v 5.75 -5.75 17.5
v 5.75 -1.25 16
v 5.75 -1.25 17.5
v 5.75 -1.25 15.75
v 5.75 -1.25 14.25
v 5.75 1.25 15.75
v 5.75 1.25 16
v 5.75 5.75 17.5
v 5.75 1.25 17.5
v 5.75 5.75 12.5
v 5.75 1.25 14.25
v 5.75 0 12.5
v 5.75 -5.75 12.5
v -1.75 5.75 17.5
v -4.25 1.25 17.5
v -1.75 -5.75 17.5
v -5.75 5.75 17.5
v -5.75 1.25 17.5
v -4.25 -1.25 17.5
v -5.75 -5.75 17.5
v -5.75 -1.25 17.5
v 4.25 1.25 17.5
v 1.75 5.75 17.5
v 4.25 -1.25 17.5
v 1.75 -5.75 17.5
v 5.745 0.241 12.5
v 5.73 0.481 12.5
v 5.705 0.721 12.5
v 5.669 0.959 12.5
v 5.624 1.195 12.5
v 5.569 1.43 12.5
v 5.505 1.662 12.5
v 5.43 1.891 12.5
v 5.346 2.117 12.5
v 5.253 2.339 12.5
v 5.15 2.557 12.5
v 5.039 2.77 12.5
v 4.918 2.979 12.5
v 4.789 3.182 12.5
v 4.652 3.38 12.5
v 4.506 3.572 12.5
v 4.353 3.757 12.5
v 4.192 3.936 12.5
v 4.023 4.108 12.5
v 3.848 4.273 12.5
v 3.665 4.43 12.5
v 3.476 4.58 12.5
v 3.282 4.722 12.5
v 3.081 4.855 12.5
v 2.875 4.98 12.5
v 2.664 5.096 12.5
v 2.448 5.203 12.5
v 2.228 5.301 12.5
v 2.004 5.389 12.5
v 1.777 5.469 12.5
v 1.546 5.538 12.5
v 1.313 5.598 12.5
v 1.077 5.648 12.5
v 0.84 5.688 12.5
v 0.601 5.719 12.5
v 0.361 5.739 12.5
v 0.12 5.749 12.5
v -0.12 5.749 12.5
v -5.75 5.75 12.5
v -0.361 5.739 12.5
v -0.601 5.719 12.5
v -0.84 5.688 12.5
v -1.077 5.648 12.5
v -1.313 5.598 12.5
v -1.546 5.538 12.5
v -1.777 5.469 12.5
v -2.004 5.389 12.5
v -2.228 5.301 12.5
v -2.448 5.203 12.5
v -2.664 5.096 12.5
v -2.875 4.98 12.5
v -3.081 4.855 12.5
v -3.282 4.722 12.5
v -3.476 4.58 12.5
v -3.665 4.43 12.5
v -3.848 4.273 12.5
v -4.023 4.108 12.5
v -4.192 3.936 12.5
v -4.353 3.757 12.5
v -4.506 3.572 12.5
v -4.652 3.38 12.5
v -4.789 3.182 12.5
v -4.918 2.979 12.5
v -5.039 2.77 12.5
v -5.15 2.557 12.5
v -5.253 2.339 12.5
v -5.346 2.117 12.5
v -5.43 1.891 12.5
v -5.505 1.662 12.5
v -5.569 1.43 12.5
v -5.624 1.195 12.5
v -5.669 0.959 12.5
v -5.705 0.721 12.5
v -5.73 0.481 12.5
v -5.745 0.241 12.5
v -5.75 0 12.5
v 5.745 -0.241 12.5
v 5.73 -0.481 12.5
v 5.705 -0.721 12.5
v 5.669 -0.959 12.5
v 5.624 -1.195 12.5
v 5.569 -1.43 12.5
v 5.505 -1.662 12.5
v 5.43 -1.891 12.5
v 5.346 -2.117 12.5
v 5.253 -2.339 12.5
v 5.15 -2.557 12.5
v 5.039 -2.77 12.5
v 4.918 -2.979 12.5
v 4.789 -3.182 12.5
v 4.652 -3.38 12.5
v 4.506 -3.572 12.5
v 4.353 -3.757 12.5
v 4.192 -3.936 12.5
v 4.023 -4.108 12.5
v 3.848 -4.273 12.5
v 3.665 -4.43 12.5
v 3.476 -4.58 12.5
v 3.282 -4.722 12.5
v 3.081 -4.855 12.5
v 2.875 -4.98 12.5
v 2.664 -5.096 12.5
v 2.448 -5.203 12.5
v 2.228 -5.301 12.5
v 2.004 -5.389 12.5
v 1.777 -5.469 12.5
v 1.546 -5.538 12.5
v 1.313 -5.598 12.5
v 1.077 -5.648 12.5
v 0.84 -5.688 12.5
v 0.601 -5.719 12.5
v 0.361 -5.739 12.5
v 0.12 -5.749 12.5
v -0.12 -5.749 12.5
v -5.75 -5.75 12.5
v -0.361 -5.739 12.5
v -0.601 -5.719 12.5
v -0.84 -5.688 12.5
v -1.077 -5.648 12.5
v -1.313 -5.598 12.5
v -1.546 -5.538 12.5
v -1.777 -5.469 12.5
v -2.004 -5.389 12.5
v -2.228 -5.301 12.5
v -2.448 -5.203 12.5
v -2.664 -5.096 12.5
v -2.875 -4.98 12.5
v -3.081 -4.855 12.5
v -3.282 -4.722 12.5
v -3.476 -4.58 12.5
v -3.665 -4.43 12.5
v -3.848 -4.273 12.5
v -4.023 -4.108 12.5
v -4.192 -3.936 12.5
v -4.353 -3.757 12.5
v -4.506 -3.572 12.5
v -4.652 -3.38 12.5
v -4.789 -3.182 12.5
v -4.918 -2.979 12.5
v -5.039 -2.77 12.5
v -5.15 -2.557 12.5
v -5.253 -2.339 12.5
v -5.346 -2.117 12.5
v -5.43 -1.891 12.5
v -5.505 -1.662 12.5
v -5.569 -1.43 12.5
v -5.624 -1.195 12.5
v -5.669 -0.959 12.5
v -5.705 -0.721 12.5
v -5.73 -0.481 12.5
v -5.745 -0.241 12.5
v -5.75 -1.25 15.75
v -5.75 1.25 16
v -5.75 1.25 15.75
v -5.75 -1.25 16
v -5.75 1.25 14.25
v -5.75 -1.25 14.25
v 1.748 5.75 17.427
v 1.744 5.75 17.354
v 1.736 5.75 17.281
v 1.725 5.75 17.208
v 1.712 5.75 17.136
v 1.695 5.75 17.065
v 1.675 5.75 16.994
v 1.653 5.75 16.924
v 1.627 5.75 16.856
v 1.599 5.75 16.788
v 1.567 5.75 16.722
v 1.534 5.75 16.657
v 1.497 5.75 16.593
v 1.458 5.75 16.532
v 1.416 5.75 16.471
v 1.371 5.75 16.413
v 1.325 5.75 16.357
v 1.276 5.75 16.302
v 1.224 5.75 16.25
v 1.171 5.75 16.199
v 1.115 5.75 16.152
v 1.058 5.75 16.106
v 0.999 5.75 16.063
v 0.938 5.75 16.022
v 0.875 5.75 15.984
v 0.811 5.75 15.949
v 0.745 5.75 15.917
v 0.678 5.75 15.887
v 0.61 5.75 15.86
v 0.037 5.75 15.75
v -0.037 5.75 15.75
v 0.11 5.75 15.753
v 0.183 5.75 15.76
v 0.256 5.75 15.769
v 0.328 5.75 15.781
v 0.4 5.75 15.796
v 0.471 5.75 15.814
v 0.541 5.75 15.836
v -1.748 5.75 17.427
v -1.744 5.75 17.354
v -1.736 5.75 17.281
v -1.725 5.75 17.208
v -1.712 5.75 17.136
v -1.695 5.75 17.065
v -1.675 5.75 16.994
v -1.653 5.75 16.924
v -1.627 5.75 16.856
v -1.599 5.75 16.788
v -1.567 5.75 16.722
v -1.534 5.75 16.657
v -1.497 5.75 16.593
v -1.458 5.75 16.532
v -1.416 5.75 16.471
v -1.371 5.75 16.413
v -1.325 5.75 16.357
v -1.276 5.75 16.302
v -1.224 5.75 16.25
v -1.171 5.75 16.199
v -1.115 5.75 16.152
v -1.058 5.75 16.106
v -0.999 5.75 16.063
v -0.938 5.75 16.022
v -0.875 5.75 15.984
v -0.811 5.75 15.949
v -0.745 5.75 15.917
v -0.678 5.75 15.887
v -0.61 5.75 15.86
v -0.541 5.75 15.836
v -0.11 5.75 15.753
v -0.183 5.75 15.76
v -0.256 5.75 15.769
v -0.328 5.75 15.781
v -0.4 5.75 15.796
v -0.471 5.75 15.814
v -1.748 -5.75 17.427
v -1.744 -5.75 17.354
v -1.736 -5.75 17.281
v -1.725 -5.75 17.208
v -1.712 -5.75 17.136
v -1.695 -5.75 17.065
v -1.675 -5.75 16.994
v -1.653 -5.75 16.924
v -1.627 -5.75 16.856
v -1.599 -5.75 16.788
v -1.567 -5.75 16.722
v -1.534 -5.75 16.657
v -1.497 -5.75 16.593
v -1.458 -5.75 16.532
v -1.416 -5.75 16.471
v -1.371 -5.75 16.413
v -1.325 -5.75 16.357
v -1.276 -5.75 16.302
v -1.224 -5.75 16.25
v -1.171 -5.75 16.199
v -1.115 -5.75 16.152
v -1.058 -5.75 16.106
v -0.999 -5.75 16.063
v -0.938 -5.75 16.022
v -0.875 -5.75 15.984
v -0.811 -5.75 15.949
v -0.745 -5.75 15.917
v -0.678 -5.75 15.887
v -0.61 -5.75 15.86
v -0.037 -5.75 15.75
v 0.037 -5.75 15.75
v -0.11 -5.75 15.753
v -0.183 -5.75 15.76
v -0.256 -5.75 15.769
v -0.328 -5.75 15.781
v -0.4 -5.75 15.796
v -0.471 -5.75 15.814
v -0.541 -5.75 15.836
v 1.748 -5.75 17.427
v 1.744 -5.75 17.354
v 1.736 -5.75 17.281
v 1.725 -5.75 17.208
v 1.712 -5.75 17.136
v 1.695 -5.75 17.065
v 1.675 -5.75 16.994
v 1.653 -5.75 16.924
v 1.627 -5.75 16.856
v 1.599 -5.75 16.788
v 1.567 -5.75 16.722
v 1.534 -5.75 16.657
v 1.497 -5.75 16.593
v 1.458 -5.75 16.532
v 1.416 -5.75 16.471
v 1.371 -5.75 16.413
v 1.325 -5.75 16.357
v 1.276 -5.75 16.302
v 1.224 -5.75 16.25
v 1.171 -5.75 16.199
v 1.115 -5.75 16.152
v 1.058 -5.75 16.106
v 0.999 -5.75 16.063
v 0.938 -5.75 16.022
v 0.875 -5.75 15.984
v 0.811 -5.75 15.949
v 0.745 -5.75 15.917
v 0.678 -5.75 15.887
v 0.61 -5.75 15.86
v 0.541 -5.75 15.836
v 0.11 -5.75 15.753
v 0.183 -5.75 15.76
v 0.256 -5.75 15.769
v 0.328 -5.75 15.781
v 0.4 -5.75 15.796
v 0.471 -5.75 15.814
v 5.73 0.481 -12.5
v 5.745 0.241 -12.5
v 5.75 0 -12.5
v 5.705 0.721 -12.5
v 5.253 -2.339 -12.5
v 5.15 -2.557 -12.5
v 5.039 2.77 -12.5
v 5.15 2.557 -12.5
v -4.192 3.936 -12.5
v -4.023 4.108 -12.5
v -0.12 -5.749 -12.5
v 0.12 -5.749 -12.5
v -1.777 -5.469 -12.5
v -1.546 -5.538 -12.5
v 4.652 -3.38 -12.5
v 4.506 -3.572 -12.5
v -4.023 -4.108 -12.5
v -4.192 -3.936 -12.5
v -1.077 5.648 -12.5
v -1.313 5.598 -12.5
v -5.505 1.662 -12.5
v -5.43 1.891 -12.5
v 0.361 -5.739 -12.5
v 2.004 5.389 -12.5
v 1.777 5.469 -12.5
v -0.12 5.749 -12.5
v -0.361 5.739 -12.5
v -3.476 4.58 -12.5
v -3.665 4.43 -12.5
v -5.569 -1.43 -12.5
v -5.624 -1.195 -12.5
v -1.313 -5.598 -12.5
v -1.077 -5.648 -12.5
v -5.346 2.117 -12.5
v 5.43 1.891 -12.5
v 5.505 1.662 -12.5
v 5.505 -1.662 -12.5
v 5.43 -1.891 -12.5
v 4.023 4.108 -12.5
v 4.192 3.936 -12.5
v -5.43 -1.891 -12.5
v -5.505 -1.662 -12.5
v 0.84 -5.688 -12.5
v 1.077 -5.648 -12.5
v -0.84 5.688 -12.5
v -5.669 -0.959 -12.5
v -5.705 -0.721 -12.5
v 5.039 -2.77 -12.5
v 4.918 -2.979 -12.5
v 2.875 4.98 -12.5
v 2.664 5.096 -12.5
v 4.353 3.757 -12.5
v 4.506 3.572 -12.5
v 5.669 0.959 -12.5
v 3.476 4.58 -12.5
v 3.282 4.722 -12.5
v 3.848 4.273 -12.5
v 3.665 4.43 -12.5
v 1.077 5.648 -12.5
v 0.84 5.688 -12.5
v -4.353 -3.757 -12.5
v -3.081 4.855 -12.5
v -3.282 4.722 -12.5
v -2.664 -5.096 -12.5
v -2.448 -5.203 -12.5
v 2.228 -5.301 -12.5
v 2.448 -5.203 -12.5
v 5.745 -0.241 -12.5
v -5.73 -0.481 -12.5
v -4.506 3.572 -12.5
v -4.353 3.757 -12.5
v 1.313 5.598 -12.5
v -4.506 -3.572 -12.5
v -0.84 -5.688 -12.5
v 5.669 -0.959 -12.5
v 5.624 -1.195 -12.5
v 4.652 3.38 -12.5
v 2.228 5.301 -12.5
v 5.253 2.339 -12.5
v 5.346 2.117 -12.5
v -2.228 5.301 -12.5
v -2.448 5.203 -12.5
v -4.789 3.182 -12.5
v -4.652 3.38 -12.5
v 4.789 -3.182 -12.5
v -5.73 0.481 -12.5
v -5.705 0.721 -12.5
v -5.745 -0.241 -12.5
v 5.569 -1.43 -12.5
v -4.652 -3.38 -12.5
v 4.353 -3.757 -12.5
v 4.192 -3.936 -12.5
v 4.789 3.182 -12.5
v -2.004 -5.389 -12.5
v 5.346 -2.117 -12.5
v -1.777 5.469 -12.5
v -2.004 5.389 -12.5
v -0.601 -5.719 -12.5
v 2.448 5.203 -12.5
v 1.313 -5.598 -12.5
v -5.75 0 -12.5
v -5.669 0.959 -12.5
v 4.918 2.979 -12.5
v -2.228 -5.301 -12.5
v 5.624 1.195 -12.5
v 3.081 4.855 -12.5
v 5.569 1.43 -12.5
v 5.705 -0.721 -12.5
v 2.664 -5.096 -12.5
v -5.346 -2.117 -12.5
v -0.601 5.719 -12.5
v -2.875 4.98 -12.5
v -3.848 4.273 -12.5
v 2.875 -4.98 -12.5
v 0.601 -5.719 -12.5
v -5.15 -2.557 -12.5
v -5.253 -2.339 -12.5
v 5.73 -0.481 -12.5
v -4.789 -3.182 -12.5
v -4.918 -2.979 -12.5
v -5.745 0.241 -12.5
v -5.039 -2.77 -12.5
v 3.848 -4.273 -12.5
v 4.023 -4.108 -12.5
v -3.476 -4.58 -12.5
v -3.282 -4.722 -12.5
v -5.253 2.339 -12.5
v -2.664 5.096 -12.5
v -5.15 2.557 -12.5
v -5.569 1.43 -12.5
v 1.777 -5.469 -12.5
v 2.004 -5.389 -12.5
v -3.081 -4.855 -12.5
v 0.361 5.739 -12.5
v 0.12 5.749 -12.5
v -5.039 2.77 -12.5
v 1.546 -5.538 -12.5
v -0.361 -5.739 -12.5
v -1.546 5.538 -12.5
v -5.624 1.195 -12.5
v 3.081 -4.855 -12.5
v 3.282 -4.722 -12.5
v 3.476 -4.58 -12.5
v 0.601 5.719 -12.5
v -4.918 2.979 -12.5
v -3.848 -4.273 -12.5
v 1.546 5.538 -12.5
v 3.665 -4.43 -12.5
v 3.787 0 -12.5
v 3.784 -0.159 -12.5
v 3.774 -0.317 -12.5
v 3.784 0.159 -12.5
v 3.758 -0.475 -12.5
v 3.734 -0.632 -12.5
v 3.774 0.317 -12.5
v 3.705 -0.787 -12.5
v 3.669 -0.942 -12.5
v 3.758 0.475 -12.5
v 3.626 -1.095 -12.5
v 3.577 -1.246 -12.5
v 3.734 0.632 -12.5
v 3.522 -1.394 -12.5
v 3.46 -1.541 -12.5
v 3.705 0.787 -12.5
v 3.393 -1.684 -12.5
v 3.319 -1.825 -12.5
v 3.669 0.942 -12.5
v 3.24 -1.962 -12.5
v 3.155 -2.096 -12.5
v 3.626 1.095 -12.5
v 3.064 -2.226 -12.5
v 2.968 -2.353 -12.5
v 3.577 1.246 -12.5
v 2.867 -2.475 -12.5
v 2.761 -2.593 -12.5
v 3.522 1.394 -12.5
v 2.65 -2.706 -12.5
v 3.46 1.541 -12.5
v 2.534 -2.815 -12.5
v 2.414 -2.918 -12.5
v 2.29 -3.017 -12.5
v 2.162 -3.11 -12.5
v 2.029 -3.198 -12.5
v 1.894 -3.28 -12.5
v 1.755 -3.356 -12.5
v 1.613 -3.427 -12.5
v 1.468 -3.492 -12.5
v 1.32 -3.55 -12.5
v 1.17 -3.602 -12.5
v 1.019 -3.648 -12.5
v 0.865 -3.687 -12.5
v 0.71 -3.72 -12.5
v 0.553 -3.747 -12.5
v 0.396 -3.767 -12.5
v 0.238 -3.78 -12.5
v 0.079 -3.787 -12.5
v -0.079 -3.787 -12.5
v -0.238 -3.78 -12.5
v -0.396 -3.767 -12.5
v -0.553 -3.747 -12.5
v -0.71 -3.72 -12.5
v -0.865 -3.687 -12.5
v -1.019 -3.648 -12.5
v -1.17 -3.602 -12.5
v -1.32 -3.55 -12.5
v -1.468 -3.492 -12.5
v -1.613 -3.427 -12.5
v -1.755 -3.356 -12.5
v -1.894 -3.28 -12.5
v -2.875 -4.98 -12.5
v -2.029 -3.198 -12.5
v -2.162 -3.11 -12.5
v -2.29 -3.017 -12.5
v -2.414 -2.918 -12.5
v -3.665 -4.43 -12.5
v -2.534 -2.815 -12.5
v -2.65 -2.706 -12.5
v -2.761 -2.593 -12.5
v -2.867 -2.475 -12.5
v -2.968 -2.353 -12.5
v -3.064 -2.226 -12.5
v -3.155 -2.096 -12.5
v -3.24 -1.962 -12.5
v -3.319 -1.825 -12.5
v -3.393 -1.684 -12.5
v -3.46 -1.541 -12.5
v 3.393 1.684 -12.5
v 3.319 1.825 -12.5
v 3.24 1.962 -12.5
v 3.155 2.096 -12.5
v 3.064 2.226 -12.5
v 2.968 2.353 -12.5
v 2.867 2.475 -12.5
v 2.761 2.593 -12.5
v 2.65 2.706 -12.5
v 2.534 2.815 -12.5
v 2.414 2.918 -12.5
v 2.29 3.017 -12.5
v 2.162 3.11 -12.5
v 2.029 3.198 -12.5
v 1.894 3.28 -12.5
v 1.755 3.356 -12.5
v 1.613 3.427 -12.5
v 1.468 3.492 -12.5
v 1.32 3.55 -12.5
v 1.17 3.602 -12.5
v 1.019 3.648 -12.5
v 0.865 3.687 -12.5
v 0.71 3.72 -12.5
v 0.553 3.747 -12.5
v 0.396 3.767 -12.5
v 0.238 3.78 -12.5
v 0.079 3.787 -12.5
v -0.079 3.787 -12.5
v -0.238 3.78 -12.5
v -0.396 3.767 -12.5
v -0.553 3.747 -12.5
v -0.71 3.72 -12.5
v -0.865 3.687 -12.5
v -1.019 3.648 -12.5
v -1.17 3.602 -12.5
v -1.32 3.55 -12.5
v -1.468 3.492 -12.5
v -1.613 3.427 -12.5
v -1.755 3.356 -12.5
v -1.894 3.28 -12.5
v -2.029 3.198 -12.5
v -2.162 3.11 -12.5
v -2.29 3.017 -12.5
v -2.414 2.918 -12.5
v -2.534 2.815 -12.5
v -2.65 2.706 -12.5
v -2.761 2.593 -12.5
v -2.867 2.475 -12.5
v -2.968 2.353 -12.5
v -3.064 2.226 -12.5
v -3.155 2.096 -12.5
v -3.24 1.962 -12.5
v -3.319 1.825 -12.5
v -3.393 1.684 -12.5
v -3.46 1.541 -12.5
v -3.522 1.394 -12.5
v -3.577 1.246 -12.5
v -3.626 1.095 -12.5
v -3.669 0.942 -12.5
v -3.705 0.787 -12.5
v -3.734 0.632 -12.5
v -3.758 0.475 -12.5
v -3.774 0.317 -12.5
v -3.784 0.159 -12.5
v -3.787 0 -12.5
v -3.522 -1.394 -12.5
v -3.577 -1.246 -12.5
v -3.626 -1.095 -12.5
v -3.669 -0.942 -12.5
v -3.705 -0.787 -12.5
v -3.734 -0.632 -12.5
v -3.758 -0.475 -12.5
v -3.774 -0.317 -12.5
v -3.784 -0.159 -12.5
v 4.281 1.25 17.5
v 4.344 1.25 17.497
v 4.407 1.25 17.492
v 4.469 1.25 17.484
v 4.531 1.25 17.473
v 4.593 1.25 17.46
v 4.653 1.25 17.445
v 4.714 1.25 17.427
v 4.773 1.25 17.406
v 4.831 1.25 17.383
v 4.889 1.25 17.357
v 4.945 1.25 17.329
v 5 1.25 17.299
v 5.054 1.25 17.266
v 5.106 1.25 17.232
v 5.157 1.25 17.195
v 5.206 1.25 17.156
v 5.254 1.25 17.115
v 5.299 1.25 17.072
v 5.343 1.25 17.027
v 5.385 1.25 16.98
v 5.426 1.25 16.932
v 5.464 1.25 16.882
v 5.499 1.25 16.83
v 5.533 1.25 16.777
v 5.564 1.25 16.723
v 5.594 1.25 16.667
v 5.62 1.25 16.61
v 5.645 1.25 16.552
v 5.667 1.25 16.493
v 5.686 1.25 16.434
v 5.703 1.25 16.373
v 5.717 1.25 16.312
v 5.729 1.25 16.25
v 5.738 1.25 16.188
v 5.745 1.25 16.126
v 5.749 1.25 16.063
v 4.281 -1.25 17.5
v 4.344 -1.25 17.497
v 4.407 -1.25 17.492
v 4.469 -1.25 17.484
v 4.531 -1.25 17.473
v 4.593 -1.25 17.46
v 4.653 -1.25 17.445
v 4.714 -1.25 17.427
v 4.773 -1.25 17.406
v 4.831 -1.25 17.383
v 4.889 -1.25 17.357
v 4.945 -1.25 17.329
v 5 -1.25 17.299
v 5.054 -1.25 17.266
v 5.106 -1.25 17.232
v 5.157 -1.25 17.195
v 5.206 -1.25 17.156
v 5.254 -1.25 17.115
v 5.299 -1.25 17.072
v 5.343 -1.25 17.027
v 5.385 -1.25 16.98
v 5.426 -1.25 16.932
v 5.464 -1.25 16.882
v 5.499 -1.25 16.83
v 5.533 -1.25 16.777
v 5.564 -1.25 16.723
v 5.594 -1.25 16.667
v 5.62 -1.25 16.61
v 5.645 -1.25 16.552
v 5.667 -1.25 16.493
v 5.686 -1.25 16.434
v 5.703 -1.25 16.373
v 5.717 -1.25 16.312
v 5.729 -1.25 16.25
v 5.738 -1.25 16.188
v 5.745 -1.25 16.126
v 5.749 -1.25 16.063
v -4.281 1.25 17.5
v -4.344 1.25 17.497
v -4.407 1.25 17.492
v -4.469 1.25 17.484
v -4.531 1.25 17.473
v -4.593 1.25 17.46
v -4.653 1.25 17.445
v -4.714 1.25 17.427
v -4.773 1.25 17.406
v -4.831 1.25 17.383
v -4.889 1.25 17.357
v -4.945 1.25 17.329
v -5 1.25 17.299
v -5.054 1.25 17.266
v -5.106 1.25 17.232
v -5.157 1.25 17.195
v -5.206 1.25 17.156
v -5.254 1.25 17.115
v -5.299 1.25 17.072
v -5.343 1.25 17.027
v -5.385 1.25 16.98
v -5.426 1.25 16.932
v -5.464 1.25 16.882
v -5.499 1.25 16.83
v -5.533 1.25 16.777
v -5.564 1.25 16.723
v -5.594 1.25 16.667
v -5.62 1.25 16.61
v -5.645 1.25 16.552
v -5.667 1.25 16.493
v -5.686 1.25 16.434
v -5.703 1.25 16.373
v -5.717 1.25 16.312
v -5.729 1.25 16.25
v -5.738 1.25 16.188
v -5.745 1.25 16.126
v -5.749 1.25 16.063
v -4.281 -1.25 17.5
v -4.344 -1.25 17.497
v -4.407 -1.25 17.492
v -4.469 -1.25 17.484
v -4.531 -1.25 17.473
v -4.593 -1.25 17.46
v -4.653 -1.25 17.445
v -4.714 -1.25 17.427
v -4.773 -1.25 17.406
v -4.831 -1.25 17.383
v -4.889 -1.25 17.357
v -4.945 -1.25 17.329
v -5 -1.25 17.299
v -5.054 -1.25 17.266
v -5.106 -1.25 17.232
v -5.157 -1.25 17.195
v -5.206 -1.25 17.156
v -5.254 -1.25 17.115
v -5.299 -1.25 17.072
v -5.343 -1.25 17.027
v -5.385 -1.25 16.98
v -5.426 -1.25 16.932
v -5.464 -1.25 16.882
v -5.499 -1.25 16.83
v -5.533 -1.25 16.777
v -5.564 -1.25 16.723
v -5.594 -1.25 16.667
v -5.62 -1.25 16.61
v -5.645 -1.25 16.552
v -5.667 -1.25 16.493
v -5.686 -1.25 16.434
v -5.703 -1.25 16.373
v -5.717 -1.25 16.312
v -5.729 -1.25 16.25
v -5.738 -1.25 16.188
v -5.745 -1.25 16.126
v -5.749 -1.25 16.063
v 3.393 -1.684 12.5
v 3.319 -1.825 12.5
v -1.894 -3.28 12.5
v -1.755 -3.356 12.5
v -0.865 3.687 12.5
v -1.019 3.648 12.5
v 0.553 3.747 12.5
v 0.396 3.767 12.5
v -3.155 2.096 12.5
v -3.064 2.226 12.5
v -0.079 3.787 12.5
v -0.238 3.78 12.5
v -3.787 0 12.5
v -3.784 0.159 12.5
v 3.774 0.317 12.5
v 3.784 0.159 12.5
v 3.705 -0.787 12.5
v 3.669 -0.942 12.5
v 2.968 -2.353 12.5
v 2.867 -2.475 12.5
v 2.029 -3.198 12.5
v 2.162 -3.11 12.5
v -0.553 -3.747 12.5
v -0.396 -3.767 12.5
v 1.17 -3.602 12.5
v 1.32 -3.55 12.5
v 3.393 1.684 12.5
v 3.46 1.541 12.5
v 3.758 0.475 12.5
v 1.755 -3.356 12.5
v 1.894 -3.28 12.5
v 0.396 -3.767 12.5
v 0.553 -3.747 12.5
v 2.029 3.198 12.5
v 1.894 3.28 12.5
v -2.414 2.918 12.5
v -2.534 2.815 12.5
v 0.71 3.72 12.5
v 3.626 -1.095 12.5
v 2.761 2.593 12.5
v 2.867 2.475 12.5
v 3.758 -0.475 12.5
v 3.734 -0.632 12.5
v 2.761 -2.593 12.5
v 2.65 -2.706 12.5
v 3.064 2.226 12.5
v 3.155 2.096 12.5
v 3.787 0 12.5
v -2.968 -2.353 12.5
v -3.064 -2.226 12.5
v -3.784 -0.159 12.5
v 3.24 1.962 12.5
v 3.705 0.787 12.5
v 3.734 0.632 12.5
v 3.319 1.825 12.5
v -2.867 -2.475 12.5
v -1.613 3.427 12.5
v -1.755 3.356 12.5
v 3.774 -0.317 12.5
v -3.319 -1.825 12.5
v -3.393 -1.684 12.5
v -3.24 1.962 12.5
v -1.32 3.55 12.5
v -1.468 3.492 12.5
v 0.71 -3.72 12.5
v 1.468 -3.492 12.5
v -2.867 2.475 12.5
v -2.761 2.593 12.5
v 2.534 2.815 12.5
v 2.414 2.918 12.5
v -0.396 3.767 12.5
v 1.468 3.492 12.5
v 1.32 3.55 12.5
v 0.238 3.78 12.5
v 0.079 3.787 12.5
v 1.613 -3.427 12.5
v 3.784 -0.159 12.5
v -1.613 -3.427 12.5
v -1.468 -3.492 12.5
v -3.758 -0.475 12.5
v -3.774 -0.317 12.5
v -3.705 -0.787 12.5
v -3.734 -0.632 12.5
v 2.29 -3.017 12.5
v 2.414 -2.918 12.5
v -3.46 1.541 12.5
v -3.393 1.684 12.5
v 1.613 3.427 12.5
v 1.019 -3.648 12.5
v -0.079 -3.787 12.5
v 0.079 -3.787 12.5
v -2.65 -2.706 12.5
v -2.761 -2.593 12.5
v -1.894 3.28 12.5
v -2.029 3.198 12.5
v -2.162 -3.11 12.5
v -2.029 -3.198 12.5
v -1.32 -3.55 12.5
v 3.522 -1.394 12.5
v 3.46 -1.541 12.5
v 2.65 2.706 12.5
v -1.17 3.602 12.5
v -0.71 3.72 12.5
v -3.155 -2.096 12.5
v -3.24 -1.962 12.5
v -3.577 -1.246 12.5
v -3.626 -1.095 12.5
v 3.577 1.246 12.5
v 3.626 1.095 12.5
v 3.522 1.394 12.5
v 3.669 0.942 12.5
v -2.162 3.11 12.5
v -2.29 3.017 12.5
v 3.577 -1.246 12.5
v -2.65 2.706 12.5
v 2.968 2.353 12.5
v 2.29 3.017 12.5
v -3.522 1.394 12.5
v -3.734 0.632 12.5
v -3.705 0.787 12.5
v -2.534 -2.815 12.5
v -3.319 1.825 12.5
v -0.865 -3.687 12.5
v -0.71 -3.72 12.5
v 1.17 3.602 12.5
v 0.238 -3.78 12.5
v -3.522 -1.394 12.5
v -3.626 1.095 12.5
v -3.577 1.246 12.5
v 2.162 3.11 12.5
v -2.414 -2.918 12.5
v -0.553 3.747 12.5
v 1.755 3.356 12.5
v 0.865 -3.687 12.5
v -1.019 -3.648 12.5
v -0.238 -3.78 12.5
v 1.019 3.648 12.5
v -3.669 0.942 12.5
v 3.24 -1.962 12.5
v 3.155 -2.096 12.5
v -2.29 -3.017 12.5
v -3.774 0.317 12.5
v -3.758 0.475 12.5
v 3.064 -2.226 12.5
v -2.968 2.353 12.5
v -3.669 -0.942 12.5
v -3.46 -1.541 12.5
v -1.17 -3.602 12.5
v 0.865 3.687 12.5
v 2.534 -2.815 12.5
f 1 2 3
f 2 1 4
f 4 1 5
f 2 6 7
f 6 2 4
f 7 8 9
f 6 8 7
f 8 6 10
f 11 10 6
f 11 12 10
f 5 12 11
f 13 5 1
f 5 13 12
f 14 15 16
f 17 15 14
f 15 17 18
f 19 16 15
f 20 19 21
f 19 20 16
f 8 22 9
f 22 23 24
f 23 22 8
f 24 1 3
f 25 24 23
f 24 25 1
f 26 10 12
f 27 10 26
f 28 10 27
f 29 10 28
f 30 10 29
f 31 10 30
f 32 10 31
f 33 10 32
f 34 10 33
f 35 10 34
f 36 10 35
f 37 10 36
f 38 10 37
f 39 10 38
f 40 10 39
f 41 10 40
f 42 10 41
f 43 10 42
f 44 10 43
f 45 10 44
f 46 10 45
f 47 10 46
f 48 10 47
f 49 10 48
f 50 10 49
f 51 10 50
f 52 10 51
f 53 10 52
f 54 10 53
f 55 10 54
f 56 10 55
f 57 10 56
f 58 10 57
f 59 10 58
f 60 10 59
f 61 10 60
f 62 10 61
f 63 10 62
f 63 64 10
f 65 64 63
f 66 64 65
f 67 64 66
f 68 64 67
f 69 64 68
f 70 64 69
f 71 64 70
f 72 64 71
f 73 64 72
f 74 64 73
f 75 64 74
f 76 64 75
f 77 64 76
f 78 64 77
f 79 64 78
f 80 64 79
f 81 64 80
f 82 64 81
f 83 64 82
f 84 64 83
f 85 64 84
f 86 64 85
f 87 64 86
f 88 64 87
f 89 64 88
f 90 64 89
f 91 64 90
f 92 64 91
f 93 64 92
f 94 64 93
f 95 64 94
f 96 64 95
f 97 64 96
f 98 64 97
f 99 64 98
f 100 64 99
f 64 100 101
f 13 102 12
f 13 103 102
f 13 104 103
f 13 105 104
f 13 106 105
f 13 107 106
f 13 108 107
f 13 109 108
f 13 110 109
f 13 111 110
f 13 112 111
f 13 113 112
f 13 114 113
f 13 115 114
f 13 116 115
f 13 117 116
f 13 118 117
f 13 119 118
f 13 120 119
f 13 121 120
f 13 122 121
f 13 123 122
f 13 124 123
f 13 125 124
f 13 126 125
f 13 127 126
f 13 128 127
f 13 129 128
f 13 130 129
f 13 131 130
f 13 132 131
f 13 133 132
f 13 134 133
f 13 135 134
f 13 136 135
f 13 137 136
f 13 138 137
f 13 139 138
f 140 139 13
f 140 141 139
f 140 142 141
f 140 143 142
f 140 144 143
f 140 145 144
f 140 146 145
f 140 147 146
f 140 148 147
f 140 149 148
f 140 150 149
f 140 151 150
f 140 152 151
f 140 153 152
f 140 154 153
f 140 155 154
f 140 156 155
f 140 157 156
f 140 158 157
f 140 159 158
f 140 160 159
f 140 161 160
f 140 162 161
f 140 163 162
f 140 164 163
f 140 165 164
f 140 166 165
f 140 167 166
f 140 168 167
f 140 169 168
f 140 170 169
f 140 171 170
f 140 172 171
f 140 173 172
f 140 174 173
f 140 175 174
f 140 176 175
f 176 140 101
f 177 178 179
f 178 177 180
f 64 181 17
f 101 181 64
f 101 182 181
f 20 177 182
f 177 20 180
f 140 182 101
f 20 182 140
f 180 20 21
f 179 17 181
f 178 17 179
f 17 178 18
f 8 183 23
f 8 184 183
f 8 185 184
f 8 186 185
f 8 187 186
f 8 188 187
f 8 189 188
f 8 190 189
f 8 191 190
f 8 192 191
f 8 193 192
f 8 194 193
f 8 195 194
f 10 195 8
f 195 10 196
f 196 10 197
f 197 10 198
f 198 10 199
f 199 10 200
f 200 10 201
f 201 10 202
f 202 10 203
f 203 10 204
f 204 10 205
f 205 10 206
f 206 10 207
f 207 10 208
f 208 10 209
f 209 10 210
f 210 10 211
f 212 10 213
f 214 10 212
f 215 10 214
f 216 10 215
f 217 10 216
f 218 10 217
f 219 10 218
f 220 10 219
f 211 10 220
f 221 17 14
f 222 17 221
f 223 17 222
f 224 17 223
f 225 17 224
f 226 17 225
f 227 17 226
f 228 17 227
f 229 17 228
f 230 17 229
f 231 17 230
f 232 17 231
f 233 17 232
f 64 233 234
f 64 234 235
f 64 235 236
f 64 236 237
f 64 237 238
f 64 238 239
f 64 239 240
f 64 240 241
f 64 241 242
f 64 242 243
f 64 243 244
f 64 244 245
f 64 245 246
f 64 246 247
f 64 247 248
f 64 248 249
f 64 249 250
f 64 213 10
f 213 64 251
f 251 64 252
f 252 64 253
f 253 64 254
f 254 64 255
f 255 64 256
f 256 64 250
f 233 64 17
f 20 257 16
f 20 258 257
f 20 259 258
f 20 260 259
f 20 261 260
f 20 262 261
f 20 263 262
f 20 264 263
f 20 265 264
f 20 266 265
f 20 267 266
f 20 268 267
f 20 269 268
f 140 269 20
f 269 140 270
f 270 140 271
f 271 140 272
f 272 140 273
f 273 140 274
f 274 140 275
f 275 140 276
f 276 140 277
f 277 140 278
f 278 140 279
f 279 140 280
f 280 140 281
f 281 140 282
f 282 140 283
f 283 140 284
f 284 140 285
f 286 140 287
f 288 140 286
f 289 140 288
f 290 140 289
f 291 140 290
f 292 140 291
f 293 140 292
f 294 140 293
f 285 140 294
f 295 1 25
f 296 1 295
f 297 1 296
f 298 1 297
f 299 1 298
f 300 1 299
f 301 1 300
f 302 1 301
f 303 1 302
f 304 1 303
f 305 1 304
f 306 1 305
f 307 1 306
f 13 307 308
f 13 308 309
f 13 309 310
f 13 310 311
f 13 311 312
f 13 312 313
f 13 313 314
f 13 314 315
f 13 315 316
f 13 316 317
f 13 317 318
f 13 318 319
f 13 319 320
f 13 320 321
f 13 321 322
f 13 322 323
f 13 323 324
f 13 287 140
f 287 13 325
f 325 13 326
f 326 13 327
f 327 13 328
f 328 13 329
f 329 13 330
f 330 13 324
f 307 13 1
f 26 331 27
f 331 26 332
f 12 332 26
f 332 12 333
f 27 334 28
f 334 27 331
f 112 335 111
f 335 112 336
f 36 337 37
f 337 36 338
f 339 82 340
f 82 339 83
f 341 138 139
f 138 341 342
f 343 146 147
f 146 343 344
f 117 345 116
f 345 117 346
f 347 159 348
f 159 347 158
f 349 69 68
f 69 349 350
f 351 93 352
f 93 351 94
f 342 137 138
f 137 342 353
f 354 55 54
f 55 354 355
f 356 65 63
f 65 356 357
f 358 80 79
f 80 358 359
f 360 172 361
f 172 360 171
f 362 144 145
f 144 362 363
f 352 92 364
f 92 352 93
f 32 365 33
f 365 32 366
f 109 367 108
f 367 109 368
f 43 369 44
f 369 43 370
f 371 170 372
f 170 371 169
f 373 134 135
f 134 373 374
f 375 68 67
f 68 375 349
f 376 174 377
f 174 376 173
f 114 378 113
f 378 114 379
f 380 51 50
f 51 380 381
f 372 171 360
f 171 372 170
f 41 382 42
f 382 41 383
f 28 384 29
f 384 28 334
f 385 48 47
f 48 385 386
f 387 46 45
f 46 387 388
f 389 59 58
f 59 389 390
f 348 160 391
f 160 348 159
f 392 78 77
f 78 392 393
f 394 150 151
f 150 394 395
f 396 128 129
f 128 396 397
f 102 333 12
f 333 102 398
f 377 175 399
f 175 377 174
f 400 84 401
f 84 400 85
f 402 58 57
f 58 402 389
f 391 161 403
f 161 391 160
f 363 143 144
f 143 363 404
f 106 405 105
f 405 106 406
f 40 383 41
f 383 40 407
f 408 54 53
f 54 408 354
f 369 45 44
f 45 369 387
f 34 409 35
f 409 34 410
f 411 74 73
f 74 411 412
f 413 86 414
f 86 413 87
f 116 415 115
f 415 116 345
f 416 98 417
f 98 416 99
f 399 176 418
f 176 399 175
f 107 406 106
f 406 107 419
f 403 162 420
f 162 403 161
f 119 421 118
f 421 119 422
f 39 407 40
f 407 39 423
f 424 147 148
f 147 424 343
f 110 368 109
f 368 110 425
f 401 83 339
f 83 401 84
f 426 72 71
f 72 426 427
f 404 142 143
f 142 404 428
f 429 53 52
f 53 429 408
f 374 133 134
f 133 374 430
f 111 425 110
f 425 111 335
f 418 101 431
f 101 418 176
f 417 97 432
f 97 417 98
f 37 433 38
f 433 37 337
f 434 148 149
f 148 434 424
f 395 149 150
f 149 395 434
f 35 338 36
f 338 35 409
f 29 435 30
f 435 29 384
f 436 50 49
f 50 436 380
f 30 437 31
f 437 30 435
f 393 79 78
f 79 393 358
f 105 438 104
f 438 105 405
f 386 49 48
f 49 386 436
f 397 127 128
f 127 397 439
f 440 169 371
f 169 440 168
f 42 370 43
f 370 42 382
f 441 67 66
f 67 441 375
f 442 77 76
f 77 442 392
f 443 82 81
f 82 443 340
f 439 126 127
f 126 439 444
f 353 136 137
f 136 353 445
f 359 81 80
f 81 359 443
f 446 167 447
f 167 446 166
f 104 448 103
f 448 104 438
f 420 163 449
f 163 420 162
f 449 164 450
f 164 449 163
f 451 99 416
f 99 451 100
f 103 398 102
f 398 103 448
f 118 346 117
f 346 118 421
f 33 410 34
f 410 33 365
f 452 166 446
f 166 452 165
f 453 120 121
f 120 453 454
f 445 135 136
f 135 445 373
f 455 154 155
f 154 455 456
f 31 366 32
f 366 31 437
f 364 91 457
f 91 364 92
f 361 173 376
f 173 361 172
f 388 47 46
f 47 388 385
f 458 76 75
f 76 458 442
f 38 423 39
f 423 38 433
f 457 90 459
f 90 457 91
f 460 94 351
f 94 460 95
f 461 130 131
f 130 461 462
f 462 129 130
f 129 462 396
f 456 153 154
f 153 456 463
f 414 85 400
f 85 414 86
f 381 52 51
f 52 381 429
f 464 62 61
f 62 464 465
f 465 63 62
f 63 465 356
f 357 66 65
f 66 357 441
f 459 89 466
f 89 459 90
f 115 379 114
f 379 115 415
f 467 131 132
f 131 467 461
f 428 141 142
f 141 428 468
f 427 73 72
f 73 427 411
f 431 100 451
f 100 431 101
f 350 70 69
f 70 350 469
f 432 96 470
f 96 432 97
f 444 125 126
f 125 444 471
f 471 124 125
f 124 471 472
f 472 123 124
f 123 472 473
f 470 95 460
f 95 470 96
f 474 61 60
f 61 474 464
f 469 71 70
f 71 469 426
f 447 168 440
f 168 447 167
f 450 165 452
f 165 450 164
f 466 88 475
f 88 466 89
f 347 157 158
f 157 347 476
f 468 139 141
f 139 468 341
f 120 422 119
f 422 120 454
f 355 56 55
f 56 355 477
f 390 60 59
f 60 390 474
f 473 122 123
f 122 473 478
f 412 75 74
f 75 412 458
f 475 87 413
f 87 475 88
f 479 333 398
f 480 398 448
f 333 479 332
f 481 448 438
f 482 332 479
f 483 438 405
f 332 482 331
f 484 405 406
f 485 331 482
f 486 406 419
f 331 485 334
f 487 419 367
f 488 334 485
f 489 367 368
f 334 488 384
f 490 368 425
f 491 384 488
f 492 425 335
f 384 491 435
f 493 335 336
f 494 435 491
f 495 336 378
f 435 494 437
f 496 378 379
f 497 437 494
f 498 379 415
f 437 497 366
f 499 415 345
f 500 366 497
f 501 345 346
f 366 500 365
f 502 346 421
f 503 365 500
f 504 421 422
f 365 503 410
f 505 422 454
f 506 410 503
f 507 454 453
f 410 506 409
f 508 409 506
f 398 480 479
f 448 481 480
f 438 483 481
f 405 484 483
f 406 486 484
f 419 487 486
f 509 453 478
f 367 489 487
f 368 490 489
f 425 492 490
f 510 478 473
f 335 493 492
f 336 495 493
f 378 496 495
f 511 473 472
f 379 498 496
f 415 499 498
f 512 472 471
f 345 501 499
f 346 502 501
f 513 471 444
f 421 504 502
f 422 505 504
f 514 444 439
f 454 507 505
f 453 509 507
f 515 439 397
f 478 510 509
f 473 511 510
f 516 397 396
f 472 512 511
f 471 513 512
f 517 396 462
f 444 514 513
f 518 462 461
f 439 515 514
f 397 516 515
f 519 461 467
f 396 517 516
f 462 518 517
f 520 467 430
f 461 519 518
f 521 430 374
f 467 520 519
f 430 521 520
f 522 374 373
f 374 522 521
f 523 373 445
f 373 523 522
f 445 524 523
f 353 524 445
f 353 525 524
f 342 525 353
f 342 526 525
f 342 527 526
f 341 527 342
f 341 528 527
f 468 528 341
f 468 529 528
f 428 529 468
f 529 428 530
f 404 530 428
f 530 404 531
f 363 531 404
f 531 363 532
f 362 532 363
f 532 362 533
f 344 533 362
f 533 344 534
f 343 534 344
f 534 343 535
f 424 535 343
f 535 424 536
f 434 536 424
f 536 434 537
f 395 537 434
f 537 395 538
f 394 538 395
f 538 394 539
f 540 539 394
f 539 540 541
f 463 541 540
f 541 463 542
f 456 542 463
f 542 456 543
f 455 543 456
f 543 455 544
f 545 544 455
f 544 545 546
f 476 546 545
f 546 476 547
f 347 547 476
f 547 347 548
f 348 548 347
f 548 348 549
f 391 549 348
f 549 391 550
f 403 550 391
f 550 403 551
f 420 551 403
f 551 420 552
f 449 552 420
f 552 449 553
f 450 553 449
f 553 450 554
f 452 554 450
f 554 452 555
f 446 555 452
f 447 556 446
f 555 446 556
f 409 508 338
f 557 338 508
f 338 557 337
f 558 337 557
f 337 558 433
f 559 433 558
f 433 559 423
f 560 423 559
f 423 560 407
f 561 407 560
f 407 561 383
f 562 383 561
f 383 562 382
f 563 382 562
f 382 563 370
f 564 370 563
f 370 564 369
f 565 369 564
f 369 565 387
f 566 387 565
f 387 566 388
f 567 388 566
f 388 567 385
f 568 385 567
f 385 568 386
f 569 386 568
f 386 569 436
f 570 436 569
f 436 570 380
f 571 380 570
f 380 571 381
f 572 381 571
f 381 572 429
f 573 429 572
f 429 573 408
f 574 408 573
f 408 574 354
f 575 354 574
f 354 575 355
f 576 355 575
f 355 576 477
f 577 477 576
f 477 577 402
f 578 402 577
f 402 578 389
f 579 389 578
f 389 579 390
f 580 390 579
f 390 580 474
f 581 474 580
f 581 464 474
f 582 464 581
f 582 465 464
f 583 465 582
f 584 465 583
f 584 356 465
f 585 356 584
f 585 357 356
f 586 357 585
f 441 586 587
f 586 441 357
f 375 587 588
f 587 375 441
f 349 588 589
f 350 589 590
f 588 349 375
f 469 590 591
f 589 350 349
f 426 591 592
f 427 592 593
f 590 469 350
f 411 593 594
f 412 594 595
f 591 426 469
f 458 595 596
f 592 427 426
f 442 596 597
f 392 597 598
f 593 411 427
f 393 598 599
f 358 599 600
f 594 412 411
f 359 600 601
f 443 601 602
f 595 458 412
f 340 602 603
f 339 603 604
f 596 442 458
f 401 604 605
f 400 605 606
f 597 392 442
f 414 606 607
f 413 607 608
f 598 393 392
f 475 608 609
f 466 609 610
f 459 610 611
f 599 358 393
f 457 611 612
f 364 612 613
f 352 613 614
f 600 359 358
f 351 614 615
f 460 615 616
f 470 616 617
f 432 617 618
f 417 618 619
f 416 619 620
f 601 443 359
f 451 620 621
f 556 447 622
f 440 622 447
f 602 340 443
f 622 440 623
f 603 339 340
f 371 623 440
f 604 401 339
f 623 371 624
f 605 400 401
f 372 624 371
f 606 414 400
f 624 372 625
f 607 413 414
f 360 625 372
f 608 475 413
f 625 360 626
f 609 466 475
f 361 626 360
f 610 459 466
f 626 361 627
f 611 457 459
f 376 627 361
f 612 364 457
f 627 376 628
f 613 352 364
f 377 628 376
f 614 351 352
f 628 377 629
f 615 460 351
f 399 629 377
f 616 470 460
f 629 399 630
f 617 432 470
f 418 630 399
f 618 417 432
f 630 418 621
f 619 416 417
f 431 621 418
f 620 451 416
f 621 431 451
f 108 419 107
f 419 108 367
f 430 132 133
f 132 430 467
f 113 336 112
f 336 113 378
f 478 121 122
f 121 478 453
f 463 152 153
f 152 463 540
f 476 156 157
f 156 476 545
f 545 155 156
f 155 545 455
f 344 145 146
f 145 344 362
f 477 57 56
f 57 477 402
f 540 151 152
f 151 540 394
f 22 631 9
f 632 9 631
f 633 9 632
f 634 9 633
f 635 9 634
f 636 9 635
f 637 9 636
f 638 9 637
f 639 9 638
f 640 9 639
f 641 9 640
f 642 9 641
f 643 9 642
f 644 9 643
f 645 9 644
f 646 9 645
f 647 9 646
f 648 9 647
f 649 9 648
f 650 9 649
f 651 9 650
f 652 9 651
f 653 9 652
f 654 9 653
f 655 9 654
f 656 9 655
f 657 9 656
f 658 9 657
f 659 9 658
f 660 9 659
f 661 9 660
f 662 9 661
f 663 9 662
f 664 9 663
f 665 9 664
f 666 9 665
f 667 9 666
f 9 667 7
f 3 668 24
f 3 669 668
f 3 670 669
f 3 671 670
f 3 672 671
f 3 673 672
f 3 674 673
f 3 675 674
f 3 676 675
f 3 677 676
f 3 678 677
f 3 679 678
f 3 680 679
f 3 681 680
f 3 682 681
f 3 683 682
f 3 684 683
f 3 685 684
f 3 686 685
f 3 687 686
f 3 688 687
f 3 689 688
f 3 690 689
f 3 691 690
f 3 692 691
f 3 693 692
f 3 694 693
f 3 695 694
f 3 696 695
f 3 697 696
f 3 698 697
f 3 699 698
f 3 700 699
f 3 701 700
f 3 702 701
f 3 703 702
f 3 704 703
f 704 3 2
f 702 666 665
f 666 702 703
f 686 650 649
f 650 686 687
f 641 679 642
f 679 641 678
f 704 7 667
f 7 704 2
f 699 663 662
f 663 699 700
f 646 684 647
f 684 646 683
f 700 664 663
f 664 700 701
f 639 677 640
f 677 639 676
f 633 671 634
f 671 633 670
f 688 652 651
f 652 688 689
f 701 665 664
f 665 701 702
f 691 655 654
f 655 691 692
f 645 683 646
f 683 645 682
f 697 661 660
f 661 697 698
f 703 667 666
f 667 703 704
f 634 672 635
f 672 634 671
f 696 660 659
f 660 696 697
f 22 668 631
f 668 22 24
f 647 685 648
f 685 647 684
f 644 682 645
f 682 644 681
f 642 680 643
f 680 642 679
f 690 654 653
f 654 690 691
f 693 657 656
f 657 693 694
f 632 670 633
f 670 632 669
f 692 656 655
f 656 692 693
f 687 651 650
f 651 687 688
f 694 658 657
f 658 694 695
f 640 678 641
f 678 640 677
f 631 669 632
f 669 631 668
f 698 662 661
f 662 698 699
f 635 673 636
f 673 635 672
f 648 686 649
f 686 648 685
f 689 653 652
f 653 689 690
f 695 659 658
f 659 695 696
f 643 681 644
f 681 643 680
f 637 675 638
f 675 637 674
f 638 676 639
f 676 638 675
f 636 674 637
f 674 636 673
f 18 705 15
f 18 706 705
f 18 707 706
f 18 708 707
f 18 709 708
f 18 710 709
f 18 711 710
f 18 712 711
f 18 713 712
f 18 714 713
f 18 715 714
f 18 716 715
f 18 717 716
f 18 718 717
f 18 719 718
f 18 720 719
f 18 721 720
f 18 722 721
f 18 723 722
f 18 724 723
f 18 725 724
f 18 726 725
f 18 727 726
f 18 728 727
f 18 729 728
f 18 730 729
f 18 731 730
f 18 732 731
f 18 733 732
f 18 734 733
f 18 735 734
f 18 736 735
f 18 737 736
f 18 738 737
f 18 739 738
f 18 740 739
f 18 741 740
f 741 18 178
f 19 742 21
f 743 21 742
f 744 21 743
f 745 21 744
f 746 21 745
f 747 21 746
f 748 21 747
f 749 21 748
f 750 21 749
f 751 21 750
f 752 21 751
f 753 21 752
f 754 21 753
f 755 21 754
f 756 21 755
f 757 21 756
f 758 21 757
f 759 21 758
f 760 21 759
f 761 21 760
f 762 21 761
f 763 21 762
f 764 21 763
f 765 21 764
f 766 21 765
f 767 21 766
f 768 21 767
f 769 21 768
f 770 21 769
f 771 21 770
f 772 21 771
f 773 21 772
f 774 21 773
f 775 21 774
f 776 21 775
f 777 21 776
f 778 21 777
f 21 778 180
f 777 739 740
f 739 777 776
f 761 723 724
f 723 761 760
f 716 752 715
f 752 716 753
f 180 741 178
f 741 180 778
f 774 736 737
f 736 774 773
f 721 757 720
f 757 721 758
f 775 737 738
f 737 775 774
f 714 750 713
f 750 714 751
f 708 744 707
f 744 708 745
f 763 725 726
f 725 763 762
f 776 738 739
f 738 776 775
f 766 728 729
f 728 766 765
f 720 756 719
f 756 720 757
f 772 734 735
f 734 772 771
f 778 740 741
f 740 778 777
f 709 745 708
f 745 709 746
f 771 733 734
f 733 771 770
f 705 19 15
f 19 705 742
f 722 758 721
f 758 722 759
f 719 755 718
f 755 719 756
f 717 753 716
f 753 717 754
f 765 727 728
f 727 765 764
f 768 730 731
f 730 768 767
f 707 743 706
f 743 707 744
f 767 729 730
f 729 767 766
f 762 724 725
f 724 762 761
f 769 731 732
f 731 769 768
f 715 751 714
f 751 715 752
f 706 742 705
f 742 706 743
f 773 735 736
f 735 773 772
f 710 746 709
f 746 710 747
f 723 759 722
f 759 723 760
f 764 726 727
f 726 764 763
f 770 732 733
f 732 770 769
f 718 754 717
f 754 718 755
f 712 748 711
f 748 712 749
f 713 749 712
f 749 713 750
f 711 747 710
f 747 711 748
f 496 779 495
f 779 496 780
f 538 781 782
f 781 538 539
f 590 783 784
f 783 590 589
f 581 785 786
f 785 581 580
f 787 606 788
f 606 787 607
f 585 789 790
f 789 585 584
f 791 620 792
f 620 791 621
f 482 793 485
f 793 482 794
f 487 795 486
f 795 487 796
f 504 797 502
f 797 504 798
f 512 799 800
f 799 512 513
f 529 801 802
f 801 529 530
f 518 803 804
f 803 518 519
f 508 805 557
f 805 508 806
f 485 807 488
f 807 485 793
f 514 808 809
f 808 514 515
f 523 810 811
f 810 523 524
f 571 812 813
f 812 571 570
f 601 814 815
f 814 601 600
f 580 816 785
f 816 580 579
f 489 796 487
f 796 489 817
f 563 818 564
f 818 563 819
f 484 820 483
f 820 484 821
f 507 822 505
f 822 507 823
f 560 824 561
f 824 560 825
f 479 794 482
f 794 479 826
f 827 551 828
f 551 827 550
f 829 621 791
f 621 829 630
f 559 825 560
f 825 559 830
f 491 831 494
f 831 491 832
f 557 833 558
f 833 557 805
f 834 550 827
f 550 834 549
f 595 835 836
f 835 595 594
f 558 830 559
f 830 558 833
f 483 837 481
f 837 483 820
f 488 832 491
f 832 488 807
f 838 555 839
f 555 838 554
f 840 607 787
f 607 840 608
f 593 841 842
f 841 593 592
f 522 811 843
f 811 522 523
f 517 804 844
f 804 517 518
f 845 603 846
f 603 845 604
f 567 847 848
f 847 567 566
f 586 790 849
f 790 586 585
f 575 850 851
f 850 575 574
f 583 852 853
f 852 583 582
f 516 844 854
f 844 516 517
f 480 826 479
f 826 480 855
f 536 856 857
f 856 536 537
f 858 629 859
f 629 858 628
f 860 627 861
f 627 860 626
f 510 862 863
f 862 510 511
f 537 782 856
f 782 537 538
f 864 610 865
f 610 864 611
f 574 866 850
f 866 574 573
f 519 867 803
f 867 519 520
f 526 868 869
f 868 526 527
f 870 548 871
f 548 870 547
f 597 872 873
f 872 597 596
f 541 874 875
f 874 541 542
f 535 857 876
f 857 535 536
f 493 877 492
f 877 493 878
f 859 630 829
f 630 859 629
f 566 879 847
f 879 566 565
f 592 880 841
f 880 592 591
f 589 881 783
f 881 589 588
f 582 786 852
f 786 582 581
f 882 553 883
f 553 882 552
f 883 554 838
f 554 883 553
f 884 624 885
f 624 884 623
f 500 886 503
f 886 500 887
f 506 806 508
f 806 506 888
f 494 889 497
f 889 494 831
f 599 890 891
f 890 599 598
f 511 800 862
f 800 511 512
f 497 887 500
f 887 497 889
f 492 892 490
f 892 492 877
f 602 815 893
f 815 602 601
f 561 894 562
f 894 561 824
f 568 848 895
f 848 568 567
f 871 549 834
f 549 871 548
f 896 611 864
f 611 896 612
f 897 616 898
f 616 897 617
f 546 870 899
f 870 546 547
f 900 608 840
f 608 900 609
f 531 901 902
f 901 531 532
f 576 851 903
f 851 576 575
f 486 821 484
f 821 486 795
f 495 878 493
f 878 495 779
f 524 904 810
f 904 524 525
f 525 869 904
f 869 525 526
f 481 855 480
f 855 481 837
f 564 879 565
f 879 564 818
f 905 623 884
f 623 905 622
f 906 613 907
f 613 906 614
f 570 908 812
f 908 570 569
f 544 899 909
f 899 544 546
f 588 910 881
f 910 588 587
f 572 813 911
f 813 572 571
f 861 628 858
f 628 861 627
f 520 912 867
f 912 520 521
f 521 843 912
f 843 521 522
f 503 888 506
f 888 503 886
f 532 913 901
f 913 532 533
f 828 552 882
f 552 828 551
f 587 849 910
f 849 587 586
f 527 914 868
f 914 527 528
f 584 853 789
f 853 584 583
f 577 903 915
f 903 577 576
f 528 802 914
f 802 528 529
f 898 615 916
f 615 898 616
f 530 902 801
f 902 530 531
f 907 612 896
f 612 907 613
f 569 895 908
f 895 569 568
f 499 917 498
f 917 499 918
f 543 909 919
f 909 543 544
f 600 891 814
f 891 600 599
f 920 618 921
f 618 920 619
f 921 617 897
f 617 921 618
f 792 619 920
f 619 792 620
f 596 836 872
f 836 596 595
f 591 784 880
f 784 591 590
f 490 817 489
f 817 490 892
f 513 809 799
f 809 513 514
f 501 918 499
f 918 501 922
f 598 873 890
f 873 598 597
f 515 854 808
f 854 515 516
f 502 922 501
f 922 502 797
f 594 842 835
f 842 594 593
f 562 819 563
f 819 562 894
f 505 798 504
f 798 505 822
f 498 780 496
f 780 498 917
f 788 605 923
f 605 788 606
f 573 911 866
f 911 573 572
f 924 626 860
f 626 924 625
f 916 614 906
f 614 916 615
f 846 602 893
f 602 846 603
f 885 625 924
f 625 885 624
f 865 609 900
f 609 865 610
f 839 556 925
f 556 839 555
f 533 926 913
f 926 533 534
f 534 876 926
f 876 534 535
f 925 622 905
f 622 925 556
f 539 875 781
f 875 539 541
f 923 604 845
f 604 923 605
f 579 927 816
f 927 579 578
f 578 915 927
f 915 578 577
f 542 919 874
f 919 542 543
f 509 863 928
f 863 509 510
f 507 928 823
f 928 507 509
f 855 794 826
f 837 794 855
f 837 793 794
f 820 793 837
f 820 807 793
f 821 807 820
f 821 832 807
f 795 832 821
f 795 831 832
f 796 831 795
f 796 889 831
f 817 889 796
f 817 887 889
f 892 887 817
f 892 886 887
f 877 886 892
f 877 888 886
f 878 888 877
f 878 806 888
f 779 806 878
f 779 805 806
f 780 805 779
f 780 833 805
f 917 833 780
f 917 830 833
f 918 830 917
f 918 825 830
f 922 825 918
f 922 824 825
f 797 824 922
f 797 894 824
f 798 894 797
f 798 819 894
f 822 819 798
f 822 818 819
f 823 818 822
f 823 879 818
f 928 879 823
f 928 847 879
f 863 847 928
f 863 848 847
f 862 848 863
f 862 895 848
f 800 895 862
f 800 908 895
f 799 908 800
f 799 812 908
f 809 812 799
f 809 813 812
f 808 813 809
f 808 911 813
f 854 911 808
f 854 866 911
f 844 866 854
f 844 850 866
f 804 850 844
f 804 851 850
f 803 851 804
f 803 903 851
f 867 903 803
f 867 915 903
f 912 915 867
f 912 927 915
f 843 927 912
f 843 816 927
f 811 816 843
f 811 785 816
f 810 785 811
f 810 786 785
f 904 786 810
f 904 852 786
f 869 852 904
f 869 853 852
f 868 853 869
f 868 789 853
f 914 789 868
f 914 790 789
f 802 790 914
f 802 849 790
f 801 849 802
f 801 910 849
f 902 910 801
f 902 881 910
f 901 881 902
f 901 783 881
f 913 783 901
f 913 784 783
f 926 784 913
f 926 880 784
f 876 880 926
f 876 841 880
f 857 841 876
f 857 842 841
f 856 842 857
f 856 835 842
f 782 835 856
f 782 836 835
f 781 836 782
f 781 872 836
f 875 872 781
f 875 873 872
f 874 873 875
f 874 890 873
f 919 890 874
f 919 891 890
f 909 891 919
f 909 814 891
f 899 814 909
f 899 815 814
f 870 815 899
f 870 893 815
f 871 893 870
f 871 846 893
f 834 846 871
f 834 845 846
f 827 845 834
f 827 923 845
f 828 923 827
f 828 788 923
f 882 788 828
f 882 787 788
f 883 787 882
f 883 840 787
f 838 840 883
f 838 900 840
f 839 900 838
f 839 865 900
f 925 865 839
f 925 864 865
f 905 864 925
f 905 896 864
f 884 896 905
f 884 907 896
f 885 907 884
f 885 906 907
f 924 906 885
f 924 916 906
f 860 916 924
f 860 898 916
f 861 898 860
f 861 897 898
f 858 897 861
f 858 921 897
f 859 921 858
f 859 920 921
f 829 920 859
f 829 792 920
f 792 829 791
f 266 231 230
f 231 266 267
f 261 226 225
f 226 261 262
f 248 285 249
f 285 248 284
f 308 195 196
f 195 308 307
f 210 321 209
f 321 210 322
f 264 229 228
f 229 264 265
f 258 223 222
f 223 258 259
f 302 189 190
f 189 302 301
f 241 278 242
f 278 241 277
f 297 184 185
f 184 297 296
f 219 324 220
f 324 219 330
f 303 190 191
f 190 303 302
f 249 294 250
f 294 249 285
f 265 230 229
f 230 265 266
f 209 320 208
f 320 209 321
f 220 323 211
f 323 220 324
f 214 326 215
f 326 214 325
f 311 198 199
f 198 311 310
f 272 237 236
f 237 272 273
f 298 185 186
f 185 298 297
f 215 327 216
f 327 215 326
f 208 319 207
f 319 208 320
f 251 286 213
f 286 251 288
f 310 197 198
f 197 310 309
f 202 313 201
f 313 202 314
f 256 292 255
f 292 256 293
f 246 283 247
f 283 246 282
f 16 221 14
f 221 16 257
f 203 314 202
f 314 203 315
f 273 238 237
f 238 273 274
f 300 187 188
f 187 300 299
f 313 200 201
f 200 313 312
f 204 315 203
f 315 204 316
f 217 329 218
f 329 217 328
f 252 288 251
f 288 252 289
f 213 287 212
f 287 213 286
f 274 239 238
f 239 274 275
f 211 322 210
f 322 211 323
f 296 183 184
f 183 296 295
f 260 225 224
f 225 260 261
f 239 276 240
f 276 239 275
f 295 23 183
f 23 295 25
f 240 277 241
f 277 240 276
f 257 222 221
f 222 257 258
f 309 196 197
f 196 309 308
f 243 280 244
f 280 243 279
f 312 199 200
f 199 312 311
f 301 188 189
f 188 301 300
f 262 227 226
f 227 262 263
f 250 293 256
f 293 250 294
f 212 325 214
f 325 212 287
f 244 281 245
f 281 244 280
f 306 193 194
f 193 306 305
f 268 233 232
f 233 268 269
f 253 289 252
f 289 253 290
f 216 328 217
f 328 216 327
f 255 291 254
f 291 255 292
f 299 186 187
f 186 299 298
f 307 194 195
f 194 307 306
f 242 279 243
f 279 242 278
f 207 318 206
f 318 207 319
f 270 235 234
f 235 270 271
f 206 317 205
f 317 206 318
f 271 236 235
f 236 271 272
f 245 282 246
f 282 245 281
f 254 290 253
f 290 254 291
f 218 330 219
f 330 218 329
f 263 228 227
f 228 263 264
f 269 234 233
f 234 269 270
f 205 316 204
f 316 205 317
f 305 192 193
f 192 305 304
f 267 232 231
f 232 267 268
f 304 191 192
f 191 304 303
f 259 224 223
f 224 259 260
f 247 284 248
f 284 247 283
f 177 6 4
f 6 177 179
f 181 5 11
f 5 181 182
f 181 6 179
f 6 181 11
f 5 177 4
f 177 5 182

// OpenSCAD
/* fiberglass stake end ziptie anchor */
$fn = ($preview)?25:150;

stake_diameter = 7.5;

wire_groove_diameter = 3.5;

wall_thickness = 2;
tube_depth = 25;
tube_diameter = stake_diameter + 2*wall_thickness;

//[width, thickness]
ziptie_dimensions = [2.5, 1.5];

top_thickness = 5;

hole_tol = 1.01;

difference() {
	//body
	union() {
		//block
		translate([0, 0, (tube_depth + top_thickness)/2]) cube([tube_diameter, tube_diameter, top_thickness], center=true);
		//tube
		cylinder(h = tube_depth, d = tube_diameter, center=true);
	}
	//stake hole
	cylinder(h = tube_depth, d = stake_diameter*hole_tol, center=true);
	//wire groove
	translate([0, 0, top_thickness + tube_depth/2]) rotate([90, 0, 0]) cylinder(h = tube_diameter, d = wire_groove_diameter, center=true);
	//ziptie channel
	translate([0, 0, (tube_depth + top_thickness)/2]) cube(concat([tube_diameter], ziptie_dimensions), center=true);
	//ziptie fillets
	translate([tube_diameter/2-ziptie_dimensions[1], 0, top_thickness+(tube_depth/2)-ziptie_dimensions[1]]) difference() {
		translate([0, -ziptie_dimensions[0]/2, 0]) cube([(top_thickness-ziptie_dimensions[1])/2, ziptie_dimensions[0], (top_thickness-ziptie_dimensions[1])/2]);
		rotate([90, 0, 0]) cylinder(h = ziptie_dimensions[0], r = ziptie_dimensions[1], center=true);
	}
	mirror([1, 0, 0]) translate([tube_diameter/2-ziptie_dimensions[1], 0, top_thickness+(tube_depth/2)-ziptie_dimensions[1]]) difference() {
		translate([0, -ziptie_dimensions[0]/2, 0]) cube([(top_thickness-ziptie_dimensions[1])/2, ziptie_dimensions[0], (top_thickness-ziptie_dimensions[1])/2]);
		rotate([90, 0, 0]) cylinder(h = ziptie_dimensions[0], r = ziptie_dimensions[1], center=true);
	};
}
